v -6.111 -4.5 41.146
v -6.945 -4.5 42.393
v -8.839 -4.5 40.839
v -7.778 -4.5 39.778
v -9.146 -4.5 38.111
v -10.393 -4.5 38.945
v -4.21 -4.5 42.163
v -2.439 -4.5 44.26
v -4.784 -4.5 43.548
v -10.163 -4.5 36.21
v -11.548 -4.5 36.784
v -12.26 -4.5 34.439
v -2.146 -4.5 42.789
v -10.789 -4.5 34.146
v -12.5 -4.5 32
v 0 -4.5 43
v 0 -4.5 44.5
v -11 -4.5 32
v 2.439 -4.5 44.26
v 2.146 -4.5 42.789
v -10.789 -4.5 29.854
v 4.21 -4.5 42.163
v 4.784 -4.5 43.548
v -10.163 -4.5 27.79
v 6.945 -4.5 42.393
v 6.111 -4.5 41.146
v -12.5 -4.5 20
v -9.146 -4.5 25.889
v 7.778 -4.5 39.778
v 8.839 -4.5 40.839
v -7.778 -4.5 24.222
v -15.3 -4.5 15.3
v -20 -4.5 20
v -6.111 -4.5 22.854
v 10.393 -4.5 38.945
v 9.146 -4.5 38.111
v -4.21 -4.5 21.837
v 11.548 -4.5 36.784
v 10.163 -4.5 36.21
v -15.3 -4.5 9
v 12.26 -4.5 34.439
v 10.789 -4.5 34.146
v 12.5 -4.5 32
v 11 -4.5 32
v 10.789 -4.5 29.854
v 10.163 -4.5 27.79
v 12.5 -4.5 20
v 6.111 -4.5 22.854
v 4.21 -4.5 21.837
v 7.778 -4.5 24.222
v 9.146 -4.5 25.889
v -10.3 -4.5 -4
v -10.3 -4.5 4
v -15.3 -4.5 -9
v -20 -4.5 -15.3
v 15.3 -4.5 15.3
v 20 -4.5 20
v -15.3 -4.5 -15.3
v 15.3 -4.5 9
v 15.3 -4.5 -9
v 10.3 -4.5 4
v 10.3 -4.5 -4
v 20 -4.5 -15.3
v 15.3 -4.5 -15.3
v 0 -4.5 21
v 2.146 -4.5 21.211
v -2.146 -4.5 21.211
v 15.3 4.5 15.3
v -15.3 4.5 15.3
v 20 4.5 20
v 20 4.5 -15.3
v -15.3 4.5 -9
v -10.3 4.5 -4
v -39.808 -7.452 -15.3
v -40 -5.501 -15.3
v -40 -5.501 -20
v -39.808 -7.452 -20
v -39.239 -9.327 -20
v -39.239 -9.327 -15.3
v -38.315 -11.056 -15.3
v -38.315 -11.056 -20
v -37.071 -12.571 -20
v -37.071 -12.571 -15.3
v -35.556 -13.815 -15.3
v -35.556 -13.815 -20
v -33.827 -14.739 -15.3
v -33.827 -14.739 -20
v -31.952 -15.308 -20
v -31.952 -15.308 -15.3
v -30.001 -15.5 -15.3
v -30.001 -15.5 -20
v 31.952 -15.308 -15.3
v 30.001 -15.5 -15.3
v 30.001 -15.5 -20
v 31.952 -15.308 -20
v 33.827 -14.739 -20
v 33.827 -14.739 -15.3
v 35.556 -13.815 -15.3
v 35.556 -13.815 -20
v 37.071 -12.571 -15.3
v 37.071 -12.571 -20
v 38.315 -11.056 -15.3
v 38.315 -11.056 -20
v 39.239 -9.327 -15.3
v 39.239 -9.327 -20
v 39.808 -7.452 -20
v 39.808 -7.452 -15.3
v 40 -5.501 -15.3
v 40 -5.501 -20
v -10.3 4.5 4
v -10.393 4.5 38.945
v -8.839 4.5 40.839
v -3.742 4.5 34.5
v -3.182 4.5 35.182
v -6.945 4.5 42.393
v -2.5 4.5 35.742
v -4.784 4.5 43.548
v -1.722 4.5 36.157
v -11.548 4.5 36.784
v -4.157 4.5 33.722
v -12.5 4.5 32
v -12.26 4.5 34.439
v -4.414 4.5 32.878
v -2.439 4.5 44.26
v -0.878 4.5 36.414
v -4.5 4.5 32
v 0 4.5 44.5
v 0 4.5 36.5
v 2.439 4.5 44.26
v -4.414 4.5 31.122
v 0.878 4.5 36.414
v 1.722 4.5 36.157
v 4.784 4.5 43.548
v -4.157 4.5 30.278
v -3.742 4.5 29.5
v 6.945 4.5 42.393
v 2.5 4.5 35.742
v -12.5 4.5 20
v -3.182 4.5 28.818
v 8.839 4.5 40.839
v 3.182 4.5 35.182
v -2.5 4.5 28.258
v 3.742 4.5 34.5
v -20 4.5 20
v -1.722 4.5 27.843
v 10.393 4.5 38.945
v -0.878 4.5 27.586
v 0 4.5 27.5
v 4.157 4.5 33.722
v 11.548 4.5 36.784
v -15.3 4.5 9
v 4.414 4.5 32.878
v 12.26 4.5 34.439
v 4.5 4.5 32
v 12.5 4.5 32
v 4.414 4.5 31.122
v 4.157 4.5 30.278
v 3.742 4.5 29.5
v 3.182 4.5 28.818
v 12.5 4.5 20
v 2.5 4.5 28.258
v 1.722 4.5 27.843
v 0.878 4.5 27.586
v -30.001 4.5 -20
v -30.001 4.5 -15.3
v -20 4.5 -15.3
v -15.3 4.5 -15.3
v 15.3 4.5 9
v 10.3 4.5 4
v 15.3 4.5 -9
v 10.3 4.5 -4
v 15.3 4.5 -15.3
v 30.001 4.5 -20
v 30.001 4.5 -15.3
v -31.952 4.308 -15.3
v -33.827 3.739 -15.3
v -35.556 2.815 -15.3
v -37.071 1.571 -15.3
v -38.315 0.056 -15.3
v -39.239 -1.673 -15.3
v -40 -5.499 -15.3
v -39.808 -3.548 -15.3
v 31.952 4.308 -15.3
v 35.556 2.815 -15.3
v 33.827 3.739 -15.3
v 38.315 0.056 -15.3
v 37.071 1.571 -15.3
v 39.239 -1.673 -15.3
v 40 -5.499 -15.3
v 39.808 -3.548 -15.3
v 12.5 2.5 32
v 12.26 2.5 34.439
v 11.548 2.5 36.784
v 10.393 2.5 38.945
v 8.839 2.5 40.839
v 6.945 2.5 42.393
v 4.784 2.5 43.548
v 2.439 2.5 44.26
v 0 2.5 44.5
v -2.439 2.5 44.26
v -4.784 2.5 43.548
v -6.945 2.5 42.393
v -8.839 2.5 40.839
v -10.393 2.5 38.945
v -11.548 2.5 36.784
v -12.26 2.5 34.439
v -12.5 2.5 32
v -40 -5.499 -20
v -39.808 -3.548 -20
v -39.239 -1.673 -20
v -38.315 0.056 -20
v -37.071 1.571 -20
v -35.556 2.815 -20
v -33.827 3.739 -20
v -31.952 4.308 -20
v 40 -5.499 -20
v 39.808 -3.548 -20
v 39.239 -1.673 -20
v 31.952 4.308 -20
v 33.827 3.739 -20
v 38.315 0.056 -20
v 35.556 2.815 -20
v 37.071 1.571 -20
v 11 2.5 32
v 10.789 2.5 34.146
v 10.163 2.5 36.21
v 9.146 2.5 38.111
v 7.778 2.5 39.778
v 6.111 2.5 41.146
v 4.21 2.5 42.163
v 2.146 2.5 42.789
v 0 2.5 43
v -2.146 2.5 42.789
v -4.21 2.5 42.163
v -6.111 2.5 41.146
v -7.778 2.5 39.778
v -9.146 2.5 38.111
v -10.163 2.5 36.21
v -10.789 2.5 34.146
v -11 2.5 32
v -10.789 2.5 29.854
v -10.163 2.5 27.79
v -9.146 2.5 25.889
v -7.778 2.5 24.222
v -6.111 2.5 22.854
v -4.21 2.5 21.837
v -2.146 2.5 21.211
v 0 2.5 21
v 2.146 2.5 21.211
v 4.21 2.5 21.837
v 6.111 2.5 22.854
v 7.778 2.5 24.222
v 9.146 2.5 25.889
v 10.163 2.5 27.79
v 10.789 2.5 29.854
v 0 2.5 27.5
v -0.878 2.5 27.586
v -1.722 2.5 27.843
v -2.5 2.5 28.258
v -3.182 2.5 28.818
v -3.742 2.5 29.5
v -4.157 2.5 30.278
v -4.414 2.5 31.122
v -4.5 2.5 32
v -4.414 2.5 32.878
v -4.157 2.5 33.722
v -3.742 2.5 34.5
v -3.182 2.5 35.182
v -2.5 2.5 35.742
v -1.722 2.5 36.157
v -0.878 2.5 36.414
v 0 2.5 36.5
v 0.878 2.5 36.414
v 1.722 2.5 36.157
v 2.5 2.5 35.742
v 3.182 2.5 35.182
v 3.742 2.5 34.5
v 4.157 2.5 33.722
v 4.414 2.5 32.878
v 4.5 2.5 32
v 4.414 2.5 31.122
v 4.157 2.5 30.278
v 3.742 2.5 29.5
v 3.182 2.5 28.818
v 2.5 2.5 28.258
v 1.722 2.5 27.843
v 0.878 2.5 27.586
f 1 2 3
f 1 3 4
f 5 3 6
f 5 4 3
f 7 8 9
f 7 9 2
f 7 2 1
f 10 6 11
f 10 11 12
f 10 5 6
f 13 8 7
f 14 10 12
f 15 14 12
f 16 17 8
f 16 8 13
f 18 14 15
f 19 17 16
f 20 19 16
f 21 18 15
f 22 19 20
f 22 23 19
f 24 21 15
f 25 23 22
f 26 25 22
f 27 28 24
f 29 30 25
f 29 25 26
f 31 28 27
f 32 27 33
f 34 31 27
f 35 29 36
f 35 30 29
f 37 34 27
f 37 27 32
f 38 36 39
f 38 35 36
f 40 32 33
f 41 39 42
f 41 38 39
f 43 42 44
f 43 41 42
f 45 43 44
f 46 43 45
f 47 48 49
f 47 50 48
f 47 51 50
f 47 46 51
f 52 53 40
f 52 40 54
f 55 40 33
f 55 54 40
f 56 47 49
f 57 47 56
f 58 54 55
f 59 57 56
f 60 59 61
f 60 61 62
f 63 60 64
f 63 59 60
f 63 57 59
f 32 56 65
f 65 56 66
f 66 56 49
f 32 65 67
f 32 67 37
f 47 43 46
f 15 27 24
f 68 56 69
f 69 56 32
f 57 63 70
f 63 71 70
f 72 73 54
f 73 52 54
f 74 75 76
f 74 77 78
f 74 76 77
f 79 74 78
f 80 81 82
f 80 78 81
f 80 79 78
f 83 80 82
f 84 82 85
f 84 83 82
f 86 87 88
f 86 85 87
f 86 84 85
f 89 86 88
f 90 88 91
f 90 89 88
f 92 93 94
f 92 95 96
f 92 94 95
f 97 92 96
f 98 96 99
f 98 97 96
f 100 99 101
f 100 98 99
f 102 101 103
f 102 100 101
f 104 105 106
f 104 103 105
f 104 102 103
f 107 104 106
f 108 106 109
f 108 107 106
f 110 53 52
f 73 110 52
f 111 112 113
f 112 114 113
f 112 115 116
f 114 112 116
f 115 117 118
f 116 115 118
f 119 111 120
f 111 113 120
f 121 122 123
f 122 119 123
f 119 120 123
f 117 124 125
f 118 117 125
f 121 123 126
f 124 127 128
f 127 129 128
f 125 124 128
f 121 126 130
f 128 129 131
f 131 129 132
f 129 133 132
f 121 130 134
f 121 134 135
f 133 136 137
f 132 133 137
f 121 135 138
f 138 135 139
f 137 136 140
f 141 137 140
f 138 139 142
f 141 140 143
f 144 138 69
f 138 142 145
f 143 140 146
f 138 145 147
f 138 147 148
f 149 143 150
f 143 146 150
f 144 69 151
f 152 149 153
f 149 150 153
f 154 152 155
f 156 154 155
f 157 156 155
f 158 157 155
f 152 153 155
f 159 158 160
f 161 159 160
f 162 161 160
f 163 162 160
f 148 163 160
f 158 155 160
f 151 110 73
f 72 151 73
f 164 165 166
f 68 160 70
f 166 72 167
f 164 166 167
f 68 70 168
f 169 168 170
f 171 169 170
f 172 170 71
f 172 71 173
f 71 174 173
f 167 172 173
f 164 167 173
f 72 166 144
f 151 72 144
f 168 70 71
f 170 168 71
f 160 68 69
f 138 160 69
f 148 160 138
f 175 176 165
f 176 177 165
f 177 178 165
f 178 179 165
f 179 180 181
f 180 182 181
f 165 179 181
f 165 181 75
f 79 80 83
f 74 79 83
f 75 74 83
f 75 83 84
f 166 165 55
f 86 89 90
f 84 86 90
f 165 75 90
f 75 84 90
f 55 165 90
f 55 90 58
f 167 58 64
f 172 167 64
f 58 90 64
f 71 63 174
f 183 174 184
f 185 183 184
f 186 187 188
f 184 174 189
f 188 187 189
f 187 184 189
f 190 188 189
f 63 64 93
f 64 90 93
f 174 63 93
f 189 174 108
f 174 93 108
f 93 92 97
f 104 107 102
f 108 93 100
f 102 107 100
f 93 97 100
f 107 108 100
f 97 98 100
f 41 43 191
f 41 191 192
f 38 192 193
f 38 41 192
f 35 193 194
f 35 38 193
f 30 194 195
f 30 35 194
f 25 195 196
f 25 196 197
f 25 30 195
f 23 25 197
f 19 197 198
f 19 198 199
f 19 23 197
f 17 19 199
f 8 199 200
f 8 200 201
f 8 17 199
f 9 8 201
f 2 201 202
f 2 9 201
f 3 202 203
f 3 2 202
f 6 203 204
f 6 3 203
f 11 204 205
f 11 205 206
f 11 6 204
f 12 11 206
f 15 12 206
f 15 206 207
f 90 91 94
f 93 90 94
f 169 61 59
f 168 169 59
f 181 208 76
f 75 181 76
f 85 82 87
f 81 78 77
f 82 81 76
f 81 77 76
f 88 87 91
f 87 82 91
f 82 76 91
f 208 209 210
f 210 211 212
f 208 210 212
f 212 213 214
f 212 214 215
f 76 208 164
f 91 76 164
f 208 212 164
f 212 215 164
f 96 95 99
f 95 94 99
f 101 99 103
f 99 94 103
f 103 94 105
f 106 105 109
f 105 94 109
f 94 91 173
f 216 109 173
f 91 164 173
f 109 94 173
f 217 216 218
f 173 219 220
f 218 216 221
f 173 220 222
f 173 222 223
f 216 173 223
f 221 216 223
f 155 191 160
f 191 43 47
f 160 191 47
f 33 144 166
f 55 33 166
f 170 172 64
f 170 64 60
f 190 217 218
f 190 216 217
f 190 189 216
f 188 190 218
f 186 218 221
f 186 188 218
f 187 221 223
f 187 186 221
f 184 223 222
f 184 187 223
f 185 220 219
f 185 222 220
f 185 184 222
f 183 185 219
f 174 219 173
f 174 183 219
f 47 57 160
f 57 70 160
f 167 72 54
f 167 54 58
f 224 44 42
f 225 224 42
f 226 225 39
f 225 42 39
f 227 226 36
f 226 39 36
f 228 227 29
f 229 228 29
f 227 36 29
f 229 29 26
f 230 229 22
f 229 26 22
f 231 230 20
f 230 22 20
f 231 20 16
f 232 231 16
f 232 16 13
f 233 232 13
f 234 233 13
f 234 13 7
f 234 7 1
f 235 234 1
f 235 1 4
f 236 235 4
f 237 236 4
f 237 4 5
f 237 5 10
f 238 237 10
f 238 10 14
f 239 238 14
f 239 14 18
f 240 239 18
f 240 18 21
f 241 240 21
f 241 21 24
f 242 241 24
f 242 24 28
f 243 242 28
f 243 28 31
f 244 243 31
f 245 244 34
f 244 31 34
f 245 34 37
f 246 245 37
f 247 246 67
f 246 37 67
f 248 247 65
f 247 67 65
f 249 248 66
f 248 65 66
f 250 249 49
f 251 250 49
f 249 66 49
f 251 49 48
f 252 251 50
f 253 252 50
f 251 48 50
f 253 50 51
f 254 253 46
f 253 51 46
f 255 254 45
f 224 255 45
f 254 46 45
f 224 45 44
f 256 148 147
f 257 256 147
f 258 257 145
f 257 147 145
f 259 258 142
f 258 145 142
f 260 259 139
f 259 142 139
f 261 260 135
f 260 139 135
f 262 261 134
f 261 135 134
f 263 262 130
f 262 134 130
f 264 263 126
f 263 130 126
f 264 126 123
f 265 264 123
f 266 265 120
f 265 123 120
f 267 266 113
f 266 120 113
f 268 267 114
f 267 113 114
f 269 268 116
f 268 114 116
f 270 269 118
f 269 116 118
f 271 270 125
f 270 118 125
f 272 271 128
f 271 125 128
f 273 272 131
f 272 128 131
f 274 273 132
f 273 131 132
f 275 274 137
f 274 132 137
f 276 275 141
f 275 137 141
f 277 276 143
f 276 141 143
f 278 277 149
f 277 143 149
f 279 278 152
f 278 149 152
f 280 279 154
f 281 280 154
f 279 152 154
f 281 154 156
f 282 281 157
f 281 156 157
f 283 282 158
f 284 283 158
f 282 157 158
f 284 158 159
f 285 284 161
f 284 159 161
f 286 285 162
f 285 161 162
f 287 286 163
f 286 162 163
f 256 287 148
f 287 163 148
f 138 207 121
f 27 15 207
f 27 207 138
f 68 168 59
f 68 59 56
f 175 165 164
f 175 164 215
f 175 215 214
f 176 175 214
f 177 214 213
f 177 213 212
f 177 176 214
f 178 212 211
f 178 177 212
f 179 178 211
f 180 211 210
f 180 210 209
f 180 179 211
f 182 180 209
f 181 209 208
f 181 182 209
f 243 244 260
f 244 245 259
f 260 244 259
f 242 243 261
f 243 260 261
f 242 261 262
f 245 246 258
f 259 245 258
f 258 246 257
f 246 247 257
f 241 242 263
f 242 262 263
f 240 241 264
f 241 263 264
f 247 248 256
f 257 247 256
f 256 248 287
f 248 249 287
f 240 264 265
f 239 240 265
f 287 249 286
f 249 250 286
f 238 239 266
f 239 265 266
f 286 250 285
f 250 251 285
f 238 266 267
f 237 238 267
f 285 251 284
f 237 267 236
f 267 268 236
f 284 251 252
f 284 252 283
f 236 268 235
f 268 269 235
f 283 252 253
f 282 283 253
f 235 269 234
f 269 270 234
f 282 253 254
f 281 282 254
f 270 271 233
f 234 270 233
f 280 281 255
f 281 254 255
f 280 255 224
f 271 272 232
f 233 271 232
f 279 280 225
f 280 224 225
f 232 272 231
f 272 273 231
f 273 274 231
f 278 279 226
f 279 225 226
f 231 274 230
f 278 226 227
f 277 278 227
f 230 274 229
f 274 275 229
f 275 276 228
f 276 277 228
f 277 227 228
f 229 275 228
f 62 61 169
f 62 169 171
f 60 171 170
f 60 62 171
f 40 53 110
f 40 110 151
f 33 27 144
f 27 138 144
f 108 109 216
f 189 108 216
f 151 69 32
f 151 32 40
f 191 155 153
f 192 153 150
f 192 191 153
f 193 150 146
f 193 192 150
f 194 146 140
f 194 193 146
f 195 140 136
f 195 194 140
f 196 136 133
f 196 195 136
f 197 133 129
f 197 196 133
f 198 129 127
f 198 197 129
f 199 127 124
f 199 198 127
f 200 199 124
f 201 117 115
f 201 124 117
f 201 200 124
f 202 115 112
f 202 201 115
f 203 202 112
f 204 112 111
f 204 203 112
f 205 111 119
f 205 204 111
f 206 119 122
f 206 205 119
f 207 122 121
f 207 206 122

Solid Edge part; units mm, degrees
sketch "Sketch1" plane through (0, 0, 0) normal (0, -1, 0) x (1, 0, 0)
  line L0 (-20, -20) -> (20, -20)
  line L1 (20, -20) -> (20, 20)
  line L2 (20, 20) -> (-20, 20)
  line L3 (-20, 20) -> (-20, -20)
extrude "Protrusion1" add sketch "Sketch1" along normal mid plane 9
sketch "Sketch2" plane through (0, -4.5, 0) normal (0, -1, 0) x (1, 0, 0)
  line L0 (-15.3, -15.3) -> (15.3, -15.3)
  line L1 (15.3, -15.3) -> (15.3, -9)
  line L2 (10.3, -4) -> (15.3, -9)
  line L3 (10.3, 4) -> (10.3, -4)
  line L4 (10.3, 4) -> (15.3, 9)
  line L5 (15.3, 9) -> (15.3, 15.3)
  line L6 (15.3, 15.3) -> (-15.3, 15.3)
  line L7 (-15.3, 15.3) -> (-15.3, 9)
  line L8 (-10.3, 4) -> (-15.3, 9)
  line L9 (-10.3, 4) -> (-10.3, -4)
  line L10 (-10.3, -4) -> (-15.3, -9)
  line L11 (-15.3, -9) -> (-15.3, -15.3)
extrude "ExtrudedCutout_1" cut sketch "Sketch2" against normal blind 161.5
sketch "Sketch3" plane through (0, -4.5, 2.35) normal (0, -1, 0) x (1, 0, 0)
  line L0 (-12.5, 29.65) -> (-12.5, 17.65)
  line L1 (-12.5, 17.65) -> (12.5, 17.65)
  line L2 (12.5, 29.65) -> (12.5, 17.65)
  arc A0 (12.5, 29.65) -> (-12.5, 29.65) centre (0, 29.65) ccw
extrude "Protrusion2" add sketch "Sketch3" against normal blind 7
sketch "Sketch4" plane through (0, -4.5, 14.6) normal (0, -1, 0) x (1, 0, 0)
  circle A0 centre (0, 17.4) radius 11
extrude "ExtrudedCutout_2" cut sketch "Sketch4" against normal blind 39
sketch "Sketch5" plane through (0, 2.5, 32.25) normal (0, 1, 0) x (0, 0, -1)
  line L0 (0.25, -12.5) -> (12.25, -12.5)
  line L1 (12.25, -12.5) -> (12.25, 12.5)
  line L2 (12.25, 12.5) -> (0.25, 12.5)
  arc A0 (0.25, 12.5) -> (0.25, -12.5) centre (0.25, 0) ccw
extrude "ExtrudedProtrusion_4" add sketch "Sketch5" along normal blind 2
sketch "Sketch6" plane through (0, 4.5, 14.6) normal (0, 1, 0) x (0, 0, -1)
  circle A0 centre (-17.4, 0) radius 4.5
extrude "ExtrudedCutout_3" cut sketch "Sketch6" against normal blind 37
sketch "Sketch7" plane through (0, 0, -20) normal (0, 0, -1) x (1, 0, 0)
  line L0 (40, -4.5) -> (-40, -4.5)
  line L1 (-40, -4.5) -> (-40, 15.5)
  line L2 (-40, 15.5) -> (40, 15.5)
  line L3 (40, 15.5) -> (40, -4.5)
  dimension "D1" = 40
extrude "Protrusion3" add sketch "Sketch7" against normal blind 4.7
fillet "Round_2" radius 10 4 edges at (-40, -15.5, -17.65) (40, 4.5, -17.65) (40, -15.5, -17.65) (-40, 4.5, -17.65)
